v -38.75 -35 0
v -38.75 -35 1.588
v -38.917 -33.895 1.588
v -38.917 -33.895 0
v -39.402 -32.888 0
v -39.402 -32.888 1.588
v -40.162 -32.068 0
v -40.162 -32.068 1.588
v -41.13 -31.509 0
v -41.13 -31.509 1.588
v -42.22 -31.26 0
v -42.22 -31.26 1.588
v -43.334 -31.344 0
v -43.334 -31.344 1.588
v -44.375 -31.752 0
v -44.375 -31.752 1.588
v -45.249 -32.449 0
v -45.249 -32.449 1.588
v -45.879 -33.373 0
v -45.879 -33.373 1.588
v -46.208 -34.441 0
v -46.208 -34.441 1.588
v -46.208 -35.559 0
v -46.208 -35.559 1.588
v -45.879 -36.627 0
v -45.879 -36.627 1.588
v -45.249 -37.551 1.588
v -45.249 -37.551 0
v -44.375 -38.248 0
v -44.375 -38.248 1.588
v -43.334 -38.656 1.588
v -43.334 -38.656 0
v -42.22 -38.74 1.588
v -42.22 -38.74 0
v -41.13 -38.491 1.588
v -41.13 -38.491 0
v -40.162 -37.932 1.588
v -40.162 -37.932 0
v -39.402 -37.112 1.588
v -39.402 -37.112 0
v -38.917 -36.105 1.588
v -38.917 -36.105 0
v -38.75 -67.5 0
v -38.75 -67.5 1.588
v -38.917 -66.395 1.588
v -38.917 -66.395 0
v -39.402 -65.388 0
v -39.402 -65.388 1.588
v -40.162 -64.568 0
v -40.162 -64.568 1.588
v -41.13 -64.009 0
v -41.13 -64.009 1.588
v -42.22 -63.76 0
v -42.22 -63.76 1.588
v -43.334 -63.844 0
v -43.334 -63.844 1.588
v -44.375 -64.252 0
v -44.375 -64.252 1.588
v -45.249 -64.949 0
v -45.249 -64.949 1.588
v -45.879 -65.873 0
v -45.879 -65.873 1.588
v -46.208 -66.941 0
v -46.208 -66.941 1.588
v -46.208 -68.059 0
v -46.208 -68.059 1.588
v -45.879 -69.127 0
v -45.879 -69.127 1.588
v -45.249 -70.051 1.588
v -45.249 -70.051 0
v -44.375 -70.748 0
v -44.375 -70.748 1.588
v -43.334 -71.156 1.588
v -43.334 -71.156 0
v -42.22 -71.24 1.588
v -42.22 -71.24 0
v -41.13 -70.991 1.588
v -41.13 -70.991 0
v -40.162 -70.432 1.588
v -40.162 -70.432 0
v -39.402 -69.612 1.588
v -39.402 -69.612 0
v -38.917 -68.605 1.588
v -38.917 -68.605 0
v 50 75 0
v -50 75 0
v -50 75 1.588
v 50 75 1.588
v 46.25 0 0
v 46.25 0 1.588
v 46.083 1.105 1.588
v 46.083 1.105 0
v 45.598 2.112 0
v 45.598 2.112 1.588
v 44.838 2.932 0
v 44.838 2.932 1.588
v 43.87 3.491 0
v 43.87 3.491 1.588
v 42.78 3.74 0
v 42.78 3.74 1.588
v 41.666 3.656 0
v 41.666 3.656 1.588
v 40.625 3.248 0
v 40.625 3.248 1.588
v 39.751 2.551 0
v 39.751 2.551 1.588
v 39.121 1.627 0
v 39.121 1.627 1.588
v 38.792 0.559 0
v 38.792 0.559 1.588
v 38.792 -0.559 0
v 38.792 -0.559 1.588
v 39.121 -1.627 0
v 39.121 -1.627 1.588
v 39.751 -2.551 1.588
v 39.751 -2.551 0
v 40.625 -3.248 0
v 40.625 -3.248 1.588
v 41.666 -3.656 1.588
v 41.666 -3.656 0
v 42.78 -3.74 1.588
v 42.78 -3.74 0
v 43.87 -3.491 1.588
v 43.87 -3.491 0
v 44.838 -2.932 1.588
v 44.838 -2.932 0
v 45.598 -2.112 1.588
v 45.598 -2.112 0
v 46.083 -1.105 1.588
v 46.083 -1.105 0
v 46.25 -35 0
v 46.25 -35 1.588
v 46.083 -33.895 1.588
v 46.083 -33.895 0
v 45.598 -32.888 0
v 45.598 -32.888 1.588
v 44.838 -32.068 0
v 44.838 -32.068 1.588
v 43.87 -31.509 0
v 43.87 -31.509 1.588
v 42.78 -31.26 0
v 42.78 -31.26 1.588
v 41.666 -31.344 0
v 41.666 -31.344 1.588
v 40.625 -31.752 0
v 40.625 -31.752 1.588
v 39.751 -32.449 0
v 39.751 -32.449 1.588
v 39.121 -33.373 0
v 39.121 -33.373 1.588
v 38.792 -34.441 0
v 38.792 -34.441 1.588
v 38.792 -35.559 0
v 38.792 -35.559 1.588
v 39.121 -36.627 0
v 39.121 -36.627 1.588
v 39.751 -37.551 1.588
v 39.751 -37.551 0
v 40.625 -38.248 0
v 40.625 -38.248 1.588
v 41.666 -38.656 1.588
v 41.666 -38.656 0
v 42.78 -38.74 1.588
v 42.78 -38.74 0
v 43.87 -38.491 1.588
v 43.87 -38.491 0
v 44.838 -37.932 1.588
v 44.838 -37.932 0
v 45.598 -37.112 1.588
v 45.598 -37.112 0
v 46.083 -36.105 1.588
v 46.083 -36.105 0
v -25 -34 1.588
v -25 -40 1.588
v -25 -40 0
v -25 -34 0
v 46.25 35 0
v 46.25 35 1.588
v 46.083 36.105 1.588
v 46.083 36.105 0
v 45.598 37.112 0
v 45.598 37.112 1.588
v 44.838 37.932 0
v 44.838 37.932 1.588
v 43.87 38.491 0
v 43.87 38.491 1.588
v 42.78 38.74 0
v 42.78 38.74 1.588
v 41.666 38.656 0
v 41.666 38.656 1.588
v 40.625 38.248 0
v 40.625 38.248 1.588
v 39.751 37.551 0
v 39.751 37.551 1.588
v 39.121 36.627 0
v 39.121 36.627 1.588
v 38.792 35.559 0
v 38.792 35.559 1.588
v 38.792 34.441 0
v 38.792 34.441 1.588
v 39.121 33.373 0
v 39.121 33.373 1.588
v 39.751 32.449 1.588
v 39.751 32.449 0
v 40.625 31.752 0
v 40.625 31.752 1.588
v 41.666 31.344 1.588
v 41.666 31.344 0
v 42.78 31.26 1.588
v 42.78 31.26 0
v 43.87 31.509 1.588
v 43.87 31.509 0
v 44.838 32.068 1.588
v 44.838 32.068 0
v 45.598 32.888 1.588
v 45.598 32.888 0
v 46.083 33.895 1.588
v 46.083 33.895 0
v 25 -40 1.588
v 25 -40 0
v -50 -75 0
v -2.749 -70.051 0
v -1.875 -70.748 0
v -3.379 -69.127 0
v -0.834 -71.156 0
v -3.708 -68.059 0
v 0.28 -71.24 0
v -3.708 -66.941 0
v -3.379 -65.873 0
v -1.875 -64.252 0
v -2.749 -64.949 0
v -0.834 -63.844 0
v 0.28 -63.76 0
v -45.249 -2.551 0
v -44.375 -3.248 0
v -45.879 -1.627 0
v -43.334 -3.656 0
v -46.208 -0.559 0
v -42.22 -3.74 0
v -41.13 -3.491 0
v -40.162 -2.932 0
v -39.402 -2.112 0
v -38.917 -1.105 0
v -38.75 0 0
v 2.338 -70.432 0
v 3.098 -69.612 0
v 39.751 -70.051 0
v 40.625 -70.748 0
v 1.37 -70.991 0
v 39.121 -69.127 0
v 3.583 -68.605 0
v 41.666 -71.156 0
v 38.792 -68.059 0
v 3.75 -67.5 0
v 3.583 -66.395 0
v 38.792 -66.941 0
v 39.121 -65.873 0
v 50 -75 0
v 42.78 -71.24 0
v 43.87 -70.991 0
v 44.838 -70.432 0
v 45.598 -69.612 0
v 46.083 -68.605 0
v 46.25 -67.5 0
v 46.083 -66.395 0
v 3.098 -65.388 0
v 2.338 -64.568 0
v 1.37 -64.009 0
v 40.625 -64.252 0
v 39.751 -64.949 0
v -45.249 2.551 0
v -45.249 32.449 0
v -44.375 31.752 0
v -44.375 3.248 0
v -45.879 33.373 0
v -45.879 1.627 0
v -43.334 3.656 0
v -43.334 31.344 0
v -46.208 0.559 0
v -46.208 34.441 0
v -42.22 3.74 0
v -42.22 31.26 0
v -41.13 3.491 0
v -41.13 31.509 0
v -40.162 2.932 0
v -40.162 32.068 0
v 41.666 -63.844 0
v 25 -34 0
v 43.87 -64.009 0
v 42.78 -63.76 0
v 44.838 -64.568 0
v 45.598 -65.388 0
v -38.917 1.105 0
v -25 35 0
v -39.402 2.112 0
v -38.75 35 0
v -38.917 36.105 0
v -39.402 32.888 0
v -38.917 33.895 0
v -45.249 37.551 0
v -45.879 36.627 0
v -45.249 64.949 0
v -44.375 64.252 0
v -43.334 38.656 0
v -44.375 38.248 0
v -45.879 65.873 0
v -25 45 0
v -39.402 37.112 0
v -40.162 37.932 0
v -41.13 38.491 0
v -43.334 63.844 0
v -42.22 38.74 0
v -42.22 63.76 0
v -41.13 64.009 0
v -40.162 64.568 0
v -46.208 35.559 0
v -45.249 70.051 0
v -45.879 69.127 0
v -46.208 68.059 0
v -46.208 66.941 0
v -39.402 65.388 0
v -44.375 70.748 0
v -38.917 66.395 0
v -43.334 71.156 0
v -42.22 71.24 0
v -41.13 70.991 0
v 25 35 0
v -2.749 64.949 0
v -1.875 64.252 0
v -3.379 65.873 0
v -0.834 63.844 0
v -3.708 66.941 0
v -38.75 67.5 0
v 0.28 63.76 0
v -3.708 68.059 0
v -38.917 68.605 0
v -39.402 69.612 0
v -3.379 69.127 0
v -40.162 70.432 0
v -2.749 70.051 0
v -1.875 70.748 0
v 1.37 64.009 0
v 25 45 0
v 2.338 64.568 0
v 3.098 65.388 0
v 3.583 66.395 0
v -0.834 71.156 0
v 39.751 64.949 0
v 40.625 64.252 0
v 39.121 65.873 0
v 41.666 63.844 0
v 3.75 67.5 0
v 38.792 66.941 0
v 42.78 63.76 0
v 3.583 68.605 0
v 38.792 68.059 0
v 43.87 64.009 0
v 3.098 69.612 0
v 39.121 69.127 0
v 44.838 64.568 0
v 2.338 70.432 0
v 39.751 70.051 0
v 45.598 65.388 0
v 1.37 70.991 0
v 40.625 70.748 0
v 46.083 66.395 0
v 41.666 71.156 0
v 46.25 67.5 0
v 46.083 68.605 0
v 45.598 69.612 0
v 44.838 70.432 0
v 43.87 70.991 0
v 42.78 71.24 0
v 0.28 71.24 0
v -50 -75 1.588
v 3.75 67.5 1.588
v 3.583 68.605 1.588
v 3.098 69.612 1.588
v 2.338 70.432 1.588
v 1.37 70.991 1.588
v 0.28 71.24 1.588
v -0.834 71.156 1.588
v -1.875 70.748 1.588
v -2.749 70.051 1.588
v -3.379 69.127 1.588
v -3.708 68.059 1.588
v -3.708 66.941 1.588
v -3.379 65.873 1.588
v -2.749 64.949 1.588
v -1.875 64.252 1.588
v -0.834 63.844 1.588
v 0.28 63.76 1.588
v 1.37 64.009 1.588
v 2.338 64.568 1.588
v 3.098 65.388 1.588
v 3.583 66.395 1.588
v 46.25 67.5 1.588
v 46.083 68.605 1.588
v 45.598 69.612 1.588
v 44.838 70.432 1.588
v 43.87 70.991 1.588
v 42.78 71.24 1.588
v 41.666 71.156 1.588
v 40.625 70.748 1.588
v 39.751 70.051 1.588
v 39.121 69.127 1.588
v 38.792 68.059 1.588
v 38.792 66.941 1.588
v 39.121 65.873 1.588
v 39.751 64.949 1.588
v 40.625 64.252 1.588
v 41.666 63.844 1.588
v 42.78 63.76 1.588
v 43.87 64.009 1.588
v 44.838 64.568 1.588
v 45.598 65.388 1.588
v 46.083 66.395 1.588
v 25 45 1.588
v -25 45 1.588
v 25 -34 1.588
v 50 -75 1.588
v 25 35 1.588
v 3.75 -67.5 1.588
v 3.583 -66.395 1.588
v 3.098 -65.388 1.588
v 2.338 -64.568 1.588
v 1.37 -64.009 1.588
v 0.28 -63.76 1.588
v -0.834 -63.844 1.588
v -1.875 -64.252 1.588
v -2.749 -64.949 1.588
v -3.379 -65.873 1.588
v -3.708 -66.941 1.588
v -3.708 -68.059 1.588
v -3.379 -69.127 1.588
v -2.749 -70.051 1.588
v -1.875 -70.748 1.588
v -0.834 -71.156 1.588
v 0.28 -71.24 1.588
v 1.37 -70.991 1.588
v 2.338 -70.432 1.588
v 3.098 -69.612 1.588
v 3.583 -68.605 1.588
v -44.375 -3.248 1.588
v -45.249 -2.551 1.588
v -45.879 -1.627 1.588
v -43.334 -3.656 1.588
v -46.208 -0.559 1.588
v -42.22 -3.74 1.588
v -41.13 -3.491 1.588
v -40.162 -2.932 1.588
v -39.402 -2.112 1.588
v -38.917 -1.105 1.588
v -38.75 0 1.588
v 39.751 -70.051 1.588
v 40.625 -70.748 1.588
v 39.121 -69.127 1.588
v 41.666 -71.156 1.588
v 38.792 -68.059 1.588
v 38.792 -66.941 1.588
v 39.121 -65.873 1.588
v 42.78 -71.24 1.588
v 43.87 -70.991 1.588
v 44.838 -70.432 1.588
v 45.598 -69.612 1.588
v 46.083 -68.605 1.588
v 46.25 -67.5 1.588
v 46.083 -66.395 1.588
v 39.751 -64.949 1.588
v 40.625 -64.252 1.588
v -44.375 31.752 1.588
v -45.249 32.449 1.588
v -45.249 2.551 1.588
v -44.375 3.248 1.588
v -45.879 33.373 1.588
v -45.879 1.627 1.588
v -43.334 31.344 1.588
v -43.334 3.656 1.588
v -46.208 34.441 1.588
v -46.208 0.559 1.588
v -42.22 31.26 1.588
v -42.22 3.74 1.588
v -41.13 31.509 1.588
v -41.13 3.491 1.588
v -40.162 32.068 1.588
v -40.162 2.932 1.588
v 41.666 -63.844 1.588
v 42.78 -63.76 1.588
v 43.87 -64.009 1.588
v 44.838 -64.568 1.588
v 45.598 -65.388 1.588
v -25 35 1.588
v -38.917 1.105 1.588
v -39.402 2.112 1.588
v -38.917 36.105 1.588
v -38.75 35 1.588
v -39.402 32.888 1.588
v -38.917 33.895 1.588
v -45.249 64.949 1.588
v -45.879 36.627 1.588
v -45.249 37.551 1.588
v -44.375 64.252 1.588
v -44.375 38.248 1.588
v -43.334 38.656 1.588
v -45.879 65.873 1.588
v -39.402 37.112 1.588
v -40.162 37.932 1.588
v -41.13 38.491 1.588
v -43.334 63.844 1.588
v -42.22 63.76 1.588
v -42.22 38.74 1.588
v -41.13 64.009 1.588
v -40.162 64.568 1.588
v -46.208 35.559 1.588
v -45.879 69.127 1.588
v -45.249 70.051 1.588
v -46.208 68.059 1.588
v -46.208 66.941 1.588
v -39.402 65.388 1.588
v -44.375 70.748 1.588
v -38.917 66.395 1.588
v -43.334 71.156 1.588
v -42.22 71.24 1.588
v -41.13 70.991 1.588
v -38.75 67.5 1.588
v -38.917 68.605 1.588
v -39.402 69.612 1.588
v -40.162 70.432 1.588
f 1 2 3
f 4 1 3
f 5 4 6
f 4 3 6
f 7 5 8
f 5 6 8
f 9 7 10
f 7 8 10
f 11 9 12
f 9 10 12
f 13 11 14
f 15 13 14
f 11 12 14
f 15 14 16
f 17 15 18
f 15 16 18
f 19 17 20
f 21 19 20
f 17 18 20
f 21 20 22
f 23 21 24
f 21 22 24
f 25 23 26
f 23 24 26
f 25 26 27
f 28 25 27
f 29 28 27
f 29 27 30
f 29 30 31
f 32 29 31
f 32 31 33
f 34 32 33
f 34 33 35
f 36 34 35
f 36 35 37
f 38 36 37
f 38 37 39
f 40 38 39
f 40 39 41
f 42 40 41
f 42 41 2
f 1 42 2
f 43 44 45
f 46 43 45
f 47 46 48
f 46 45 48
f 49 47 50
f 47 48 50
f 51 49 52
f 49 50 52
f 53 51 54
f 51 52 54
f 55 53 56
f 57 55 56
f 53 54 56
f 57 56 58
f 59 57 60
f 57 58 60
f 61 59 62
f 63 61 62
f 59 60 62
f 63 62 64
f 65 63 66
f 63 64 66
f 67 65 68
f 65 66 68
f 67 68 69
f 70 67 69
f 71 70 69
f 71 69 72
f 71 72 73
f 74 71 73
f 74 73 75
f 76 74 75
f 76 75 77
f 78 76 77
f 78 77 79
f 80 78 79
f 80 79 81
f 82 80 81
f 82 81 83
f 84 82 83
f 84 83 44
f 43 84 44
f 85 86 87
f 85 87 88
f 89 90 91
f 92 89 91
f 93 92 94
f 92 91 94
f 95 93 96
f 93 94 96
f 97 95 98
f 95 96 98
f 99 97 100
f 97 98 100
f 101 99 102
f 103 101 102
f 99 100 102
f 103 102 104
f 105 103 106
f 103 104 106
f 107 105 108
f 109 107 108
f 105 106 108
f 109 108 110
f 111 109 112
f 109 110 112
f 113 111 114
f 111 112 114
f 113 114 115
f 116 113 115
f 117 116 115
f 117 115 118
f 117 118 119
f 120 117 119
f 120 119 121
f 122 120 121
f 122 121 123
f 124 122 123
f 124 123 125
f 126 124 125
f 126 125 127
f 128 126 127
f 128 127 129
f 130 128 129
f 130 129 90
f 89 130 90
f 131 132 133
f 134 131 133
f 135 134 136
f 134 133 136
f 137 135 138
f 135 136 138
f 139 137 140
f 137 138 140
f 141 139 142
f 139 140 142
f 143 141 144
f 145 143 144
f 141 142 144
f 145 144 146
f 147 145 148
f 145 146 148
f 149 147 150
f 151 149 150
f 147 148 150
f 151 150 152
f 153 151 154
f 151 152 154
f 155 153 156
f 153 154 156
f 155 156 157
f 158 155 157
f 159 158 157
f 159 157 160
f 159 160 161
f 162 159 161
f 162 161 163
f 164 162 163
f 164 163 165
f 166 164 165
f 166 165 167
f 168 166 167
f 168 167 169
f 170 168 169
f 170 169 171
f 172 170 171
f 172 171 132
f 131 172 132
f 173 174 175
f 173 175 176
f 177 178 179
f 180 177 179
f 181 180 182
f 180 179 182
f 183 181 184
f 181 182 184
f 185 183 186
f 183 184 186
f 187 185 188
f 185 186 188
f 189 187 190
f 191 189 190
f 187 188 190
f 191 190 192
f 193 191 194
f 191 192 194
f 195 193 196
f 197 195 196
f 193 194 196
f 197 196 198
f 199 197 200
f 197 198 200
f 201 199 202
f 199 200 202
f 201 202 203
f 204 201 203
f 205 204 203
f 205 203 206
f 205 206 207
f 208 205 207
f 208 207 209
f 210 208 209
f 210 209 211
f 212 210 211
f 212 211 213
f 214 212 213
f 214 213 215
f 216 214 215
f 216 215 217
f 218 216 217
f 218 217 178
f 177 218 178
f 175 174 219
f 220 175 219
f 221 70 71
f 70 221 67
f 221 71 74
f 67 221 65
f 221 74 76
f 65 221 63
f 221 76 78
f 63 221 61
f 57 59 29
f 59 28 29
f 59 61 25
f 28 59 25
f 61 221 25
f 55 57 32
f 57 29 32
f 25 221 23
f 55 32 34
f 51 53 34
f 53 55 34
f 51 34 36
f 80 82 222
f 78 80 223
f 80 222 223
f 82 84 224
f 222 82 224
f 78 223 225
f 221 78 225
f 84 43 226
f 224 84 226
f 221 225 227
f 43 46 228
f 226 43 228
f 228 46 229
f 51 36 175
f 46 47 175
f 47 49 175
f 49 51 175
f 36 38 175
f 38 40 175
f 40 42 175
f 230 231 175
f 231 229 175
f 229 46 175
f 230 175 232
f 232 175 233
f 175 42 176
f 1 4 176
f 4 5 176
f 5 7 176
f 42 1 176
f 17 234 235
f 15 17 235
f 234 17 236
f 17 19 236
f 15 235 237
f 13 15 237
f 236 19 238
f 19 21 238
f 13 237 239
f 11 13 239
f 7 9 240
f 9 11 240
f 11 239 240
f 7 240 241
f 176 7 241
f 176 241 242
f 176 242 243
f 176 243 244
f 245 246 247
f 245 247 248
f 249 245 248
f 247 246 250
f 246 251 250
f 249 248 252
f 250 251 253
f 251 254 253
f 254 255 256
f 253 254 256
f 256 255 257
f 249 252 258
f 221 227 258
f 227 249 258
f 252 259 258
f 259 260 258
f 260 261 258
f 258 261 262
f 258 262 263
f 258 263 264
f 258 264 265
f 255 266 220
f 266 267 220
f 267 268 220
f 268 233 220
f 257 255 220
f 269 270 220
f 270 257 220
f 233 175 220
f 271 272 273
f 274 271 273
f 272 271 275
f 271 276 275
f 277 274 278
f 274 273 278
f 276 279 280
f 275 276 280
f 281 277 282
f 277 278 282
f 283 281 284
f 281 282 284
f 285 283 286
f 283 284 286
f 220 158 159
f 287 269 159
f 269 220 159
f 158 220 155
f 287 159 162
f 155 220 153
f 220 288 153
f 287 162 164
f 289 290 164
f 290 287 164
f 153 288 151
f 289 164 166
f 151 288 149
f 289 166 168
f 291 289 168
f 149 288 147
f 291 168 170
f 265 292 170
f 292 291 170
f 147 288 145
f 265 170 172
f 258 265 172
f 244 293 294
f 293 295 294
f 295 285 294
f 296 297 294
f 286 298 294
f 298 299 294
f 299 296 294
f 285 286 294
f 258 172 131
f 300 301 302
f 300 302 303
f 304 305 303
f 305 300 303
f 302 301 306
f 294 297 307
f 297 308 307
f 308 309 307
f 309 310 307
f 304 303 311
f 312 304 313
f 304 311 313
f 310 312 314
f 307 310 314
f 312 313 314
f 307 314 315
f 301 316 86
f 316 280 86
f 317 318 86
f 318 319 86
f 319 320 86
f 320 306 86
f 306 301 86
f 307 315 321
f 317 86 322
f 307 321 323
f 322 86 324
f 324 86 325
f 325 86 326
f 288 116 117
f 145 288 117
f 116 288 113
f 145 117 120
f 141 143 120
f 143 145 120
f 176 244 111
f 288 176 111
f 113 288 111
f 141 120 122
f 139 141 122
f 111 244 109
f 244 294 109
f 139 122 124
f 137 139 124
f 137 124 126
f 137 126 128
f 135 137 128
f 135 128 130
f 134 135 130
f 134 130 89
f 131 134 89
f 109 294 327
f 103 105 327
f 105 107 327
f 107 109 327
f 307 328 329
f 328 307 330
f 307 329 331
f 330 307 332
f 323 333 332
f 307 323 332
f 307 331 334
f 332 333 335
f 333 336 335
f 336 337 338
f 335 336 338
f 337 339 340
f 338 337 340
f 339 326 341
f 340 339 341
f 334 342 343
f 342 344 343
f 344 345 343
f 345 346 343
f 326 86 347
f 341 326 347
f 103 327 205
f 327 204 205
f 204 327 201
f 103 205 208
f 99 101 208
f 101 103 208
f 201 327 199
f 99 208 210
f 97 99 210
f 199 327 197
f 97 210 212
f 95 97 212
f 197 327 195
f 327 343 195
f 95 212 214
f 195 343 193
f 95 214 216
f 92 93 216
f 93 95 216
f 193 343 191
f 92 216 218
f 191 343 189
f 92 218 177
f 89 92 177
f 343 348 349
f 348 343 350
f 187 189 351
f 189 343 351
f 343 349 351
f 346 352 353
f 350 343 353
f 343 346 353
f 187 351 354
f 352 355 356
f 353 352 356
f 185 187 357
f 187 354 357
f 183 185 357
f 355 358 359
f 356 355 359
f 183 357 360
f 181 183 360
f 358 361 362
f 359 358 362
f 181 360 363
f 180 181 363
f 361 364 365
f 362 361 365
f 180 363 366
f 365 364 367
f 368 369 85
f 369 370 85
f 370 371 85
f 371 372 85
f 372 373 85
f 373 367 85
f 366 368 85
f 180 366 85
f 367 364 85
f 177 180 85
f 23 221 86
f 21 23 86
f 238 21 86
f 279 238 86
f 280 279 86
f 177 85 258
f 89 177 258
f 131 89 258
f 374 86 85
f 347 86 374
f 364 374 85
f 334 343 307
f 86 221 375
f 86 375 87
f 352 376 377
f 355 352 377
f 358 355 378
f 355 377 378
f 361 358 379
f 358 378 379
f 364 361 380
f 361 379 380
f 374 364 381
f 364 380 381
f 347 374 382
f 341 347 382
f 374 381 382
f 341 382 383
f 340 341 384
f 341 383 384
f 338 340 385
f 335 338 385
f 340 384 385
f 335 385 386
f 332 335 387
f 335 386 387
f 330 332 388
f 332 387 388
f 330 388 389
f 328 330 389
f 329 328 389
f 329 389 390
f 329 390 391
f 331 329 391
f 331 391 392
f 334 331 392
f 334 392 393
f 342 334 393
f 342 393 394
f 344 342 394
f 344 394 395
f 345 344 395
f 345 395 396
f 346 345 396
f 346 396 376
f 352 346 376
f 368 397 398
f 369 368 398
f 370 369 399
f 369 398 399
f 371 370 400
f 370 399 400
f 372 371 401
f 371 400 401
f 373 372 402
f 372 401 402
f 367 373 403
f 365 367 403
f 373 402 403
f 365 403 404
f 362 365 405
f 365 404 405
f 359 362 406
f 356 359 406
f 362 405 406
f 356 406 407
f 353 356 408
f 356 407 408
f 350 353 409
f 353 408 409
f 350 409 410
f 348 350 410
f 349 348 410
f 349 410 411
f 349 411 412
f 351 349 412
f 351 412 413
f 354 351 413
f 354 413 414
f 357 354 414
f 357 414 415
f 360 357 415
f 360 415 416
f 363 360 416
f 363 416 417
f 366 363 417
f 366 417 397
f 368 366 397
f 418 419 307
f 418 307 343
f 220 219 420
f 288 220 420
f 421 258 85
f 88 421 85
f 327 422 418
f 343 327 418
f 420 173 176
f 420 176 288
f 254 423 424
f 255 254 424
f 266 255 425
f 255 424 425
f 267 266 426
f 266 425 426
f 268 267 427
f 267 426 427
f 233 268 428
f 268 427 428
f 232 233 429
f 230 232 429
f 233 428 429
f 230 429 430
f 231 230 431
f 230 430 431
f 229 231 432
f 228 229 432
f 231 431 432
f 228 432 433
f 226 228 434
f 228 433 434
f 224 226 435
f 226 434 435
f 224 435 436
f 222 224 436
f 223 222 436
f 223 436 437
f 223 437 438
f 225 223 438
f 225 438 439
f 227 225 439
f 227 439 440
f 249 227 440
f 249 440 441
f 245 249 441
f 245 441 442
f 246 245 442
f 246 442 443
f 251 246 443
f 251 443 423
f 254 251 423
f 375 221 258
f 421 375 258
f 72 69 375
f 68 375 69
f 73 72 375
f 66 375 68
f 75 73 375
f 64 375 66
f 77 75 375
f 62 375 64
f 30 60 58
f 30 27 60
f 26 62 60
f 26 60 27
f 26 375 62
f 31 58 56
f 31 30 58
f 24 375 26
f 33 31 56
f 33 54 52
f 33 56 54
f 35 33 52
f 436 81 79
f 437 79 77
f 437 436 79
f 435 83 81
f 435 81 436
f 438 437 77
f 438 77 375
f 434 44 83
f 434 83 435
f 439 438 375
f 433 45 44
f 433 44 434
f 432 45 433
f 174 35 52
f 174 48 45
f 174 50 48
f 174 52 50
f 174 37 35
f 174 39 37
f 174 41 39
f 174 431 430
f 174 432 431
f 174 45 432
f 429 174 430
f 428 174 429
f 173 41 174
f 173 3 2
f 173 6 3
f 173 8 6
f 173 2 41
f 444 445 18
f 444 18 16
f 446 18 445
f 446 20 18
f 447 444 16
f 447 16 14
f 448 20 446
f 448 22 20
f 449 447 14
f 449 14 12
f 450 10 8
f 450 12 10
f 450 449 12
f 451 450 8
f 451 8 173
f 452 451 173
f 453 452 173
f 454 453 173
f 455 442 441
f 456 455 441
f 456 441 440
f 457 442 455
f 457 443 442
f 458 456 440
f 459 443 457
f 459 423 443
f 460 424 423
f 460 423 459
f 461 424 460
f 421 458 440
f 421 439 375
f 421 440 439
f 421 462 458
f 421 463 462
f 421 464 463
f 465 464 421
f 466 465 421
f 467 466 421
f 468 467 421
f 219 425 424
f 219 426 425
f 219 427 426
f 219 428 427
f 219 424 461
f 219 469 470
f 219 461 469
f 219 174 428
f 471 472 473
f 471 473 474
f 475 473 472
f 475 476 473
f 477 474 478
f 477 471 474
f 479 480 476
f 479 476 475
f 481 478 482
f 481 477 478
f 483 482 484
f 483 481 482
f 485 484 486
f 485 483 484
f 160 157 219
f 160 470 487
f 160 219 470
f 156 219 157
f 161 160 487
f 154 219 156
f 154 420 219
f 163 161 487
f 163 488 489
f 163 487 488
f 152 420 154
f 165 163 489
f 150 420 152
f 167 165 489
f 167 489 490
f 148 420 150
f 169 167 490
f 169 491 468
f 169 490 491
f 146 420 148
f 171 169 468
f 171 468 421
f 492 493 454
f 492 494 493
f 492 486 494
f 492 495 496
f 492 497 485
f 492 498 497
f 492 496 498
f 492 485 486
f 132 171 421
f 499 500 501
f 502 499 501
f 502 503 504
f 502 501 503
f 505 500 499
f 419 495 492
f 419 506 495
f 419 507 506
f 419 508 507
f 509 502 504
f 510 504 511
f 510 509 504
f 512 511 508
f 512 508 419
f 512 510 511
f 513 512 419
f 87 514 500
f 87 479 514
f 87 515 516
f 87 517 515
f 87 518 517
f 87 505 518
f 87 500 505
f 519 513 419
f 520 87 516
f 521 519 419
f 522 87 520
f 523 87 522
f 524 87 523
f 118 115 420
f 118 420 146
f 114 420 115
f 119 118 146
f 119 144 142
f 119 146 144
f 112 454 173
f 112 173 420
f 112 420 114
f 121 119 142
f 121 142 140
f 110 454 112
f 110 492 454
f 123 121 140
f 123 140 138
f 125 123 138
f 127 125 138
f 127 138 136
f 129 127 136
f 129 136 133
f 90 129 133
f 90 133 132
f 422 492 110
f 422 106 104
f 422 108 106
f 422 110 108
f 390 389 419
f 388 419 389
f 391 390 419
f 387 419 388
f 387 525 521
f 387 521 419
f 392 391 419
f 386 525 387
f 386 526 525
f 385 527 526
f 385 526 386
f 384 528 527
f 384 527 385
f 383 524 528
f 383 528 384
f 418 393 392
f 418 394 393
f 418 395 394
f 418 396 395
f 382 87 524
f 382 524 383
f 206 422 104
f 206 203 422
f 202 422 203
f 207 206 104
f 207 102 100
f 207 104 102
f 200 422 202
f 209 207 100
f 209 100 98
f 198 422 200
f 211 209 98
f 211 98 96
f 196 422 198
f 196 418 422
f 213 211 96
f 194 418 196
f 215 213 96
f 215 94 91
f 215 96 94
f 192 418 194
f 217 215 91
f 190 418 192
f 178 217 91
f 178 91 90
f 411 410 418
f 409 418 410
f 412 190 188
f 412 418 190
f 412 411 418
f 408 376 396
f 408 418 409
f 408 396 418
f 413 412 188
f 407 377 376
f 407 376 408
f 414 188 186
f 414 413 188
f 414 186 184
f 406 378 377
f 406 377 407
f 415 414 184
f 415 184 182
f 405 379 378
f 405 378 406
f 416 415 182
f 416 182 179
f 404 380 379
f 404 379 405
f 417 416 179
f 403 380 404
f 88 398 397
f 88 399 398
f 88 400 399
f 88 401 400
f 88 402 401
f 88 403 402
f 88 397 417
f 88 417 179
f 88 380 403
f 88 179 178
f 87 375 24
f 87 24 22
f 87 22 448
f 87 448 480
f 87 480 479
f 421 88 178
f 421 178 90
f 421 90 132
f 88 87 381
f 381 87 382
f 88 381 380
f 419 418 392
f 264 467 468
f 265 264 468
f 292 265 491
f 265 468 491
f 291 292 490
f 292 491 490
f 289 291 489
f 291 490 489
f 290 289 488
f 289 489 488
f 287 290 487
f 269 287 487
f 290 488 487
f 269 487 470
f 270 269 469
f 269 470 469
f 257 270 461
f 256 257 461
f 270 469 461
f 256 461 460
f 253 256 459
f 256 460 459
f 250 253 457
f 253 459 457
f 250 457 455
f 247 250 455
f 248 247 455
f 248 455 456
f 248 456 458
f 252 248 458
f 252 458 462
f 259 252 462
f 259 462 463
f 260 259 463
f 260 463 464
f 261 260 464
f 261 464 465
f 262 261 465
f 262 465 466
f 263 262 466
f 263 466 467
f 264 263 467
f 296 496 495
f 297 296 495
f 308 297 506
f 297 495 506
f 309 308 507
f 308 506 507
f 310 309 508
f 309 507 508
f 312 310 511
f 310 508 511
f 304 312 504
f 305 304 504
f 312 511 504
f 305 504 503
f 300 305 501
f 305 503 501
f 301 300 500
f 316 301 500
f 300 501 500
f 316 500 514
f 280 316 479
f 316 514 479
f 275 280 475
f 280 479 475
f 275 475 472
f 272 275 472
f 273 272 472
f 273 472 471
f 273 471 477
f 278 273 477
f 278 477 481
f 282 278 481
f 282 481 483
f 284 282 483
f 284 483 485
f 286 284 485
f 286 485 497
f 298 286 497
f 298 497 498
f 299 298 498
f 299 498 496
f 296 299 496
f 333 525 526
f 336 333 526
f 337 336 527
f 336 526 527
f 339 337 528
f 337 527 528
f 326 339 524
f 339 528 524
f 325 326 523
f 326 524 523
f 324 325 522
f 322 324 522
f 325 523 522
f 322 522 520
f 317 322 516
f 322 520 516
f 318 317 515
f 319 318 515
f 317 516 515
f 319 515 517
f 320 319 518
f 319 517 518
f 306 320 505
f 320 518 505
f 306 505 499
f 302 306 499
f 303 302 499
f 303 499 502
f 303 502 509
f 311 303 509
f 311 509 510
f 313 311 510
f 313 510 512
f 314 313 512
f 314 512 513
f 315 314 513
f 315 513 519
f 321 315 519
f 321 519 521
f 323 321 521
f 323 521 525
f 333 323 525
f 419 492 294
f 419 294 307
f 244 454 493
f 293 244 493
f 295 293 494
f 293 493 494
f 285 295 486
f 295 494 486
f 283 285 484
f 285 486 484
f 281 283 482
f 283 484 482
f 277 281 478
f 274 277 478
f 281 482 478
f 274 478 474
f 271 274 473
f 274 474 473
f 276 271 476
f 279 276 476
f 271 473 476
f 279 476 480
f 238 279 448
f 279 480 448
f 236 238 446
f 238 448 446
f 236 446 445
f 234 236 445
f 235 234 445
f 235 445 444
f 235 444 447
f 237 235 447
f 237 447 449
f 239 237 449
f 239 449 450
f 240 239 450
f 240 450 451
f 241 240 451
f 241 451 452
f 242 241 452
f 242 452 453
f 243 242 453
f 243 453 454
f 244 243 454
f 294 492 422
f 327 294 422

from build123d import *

# Parameters (mm, degrees)
F0_W     = 100
F0_H     = 150
F1_DEPTH = 1.5875
F2_R     = 3.75
F3_DEPTH = 25
F4_W     = 50
F4_H     = 6
F5_DEPTH = 25
F6_W     = 50
F6_H     = 10
F7_DEPTH = 25


# Not quite as in the source:
# - a feature names something its author has since deleted; it is built from what else it names


with BuildPart() as f1:
    # F0 (on Top) → F1 (new body)
    with BuildSketch(Plane.XY):
        Rectangle(F0_W, F0_H)
    extrude(amount=F1_DEPTH)

    # F2 (on face) → F3 (cut)
    with BuildSketch(Plane.XY.offset(1.5875)):
        with Locations((-42.5, 67.5)):
            Circle(F2_R)
        with Locations((-42.5, 0)):
            Circle(F2_R)
        with Locations((-42.5, -35)):
            Circle(F2_R)
        with Locations((-42.5, -67.5)):
            Circle(F2_R)
        with Locations((0, -67.5)):
            Circle(F2_R)
        with Locations((-42.5, 35)):
            Circle(F2_R)
        with Locations((42.5, -67.5)):
            Circle(F2_R)
        with Locations((42.5, -35)):
            Circle(F2_R)
        with Locations((42.5, 0)):
            Circle(F2_R)
        with Locations((42.5, 35)):
            Circle(F2_R)
        with Locations((42.5, 67.5)):
            Circle(F2_R)
        with Locations((0, 67.5)):
            Circle(F2_R)
    extrude(amount=-F3_DEPTH, mode=Mode.SUBTRACT)

    # F4 (on face) → F5 (cut)
    with BuildSketch(Plane.XY.offset(1.5875)):
        with Locations((0, -37)):
            Rectangle(F4_W, F4_H)
    extrude(amount=-F5_DEPTH, mode=Mode.SUBTRACT)

    # F6 (on face) → F7 (cut)
    with BuildSketch(Plane.XY.offset(1.5875)):
        with Locations((0, 40)):
            Rectangle(F6_W, F6_H)
    extrude(amount=-F7_DEPTH, mode=Mode.SUBTRACT)


solid = f1.part
